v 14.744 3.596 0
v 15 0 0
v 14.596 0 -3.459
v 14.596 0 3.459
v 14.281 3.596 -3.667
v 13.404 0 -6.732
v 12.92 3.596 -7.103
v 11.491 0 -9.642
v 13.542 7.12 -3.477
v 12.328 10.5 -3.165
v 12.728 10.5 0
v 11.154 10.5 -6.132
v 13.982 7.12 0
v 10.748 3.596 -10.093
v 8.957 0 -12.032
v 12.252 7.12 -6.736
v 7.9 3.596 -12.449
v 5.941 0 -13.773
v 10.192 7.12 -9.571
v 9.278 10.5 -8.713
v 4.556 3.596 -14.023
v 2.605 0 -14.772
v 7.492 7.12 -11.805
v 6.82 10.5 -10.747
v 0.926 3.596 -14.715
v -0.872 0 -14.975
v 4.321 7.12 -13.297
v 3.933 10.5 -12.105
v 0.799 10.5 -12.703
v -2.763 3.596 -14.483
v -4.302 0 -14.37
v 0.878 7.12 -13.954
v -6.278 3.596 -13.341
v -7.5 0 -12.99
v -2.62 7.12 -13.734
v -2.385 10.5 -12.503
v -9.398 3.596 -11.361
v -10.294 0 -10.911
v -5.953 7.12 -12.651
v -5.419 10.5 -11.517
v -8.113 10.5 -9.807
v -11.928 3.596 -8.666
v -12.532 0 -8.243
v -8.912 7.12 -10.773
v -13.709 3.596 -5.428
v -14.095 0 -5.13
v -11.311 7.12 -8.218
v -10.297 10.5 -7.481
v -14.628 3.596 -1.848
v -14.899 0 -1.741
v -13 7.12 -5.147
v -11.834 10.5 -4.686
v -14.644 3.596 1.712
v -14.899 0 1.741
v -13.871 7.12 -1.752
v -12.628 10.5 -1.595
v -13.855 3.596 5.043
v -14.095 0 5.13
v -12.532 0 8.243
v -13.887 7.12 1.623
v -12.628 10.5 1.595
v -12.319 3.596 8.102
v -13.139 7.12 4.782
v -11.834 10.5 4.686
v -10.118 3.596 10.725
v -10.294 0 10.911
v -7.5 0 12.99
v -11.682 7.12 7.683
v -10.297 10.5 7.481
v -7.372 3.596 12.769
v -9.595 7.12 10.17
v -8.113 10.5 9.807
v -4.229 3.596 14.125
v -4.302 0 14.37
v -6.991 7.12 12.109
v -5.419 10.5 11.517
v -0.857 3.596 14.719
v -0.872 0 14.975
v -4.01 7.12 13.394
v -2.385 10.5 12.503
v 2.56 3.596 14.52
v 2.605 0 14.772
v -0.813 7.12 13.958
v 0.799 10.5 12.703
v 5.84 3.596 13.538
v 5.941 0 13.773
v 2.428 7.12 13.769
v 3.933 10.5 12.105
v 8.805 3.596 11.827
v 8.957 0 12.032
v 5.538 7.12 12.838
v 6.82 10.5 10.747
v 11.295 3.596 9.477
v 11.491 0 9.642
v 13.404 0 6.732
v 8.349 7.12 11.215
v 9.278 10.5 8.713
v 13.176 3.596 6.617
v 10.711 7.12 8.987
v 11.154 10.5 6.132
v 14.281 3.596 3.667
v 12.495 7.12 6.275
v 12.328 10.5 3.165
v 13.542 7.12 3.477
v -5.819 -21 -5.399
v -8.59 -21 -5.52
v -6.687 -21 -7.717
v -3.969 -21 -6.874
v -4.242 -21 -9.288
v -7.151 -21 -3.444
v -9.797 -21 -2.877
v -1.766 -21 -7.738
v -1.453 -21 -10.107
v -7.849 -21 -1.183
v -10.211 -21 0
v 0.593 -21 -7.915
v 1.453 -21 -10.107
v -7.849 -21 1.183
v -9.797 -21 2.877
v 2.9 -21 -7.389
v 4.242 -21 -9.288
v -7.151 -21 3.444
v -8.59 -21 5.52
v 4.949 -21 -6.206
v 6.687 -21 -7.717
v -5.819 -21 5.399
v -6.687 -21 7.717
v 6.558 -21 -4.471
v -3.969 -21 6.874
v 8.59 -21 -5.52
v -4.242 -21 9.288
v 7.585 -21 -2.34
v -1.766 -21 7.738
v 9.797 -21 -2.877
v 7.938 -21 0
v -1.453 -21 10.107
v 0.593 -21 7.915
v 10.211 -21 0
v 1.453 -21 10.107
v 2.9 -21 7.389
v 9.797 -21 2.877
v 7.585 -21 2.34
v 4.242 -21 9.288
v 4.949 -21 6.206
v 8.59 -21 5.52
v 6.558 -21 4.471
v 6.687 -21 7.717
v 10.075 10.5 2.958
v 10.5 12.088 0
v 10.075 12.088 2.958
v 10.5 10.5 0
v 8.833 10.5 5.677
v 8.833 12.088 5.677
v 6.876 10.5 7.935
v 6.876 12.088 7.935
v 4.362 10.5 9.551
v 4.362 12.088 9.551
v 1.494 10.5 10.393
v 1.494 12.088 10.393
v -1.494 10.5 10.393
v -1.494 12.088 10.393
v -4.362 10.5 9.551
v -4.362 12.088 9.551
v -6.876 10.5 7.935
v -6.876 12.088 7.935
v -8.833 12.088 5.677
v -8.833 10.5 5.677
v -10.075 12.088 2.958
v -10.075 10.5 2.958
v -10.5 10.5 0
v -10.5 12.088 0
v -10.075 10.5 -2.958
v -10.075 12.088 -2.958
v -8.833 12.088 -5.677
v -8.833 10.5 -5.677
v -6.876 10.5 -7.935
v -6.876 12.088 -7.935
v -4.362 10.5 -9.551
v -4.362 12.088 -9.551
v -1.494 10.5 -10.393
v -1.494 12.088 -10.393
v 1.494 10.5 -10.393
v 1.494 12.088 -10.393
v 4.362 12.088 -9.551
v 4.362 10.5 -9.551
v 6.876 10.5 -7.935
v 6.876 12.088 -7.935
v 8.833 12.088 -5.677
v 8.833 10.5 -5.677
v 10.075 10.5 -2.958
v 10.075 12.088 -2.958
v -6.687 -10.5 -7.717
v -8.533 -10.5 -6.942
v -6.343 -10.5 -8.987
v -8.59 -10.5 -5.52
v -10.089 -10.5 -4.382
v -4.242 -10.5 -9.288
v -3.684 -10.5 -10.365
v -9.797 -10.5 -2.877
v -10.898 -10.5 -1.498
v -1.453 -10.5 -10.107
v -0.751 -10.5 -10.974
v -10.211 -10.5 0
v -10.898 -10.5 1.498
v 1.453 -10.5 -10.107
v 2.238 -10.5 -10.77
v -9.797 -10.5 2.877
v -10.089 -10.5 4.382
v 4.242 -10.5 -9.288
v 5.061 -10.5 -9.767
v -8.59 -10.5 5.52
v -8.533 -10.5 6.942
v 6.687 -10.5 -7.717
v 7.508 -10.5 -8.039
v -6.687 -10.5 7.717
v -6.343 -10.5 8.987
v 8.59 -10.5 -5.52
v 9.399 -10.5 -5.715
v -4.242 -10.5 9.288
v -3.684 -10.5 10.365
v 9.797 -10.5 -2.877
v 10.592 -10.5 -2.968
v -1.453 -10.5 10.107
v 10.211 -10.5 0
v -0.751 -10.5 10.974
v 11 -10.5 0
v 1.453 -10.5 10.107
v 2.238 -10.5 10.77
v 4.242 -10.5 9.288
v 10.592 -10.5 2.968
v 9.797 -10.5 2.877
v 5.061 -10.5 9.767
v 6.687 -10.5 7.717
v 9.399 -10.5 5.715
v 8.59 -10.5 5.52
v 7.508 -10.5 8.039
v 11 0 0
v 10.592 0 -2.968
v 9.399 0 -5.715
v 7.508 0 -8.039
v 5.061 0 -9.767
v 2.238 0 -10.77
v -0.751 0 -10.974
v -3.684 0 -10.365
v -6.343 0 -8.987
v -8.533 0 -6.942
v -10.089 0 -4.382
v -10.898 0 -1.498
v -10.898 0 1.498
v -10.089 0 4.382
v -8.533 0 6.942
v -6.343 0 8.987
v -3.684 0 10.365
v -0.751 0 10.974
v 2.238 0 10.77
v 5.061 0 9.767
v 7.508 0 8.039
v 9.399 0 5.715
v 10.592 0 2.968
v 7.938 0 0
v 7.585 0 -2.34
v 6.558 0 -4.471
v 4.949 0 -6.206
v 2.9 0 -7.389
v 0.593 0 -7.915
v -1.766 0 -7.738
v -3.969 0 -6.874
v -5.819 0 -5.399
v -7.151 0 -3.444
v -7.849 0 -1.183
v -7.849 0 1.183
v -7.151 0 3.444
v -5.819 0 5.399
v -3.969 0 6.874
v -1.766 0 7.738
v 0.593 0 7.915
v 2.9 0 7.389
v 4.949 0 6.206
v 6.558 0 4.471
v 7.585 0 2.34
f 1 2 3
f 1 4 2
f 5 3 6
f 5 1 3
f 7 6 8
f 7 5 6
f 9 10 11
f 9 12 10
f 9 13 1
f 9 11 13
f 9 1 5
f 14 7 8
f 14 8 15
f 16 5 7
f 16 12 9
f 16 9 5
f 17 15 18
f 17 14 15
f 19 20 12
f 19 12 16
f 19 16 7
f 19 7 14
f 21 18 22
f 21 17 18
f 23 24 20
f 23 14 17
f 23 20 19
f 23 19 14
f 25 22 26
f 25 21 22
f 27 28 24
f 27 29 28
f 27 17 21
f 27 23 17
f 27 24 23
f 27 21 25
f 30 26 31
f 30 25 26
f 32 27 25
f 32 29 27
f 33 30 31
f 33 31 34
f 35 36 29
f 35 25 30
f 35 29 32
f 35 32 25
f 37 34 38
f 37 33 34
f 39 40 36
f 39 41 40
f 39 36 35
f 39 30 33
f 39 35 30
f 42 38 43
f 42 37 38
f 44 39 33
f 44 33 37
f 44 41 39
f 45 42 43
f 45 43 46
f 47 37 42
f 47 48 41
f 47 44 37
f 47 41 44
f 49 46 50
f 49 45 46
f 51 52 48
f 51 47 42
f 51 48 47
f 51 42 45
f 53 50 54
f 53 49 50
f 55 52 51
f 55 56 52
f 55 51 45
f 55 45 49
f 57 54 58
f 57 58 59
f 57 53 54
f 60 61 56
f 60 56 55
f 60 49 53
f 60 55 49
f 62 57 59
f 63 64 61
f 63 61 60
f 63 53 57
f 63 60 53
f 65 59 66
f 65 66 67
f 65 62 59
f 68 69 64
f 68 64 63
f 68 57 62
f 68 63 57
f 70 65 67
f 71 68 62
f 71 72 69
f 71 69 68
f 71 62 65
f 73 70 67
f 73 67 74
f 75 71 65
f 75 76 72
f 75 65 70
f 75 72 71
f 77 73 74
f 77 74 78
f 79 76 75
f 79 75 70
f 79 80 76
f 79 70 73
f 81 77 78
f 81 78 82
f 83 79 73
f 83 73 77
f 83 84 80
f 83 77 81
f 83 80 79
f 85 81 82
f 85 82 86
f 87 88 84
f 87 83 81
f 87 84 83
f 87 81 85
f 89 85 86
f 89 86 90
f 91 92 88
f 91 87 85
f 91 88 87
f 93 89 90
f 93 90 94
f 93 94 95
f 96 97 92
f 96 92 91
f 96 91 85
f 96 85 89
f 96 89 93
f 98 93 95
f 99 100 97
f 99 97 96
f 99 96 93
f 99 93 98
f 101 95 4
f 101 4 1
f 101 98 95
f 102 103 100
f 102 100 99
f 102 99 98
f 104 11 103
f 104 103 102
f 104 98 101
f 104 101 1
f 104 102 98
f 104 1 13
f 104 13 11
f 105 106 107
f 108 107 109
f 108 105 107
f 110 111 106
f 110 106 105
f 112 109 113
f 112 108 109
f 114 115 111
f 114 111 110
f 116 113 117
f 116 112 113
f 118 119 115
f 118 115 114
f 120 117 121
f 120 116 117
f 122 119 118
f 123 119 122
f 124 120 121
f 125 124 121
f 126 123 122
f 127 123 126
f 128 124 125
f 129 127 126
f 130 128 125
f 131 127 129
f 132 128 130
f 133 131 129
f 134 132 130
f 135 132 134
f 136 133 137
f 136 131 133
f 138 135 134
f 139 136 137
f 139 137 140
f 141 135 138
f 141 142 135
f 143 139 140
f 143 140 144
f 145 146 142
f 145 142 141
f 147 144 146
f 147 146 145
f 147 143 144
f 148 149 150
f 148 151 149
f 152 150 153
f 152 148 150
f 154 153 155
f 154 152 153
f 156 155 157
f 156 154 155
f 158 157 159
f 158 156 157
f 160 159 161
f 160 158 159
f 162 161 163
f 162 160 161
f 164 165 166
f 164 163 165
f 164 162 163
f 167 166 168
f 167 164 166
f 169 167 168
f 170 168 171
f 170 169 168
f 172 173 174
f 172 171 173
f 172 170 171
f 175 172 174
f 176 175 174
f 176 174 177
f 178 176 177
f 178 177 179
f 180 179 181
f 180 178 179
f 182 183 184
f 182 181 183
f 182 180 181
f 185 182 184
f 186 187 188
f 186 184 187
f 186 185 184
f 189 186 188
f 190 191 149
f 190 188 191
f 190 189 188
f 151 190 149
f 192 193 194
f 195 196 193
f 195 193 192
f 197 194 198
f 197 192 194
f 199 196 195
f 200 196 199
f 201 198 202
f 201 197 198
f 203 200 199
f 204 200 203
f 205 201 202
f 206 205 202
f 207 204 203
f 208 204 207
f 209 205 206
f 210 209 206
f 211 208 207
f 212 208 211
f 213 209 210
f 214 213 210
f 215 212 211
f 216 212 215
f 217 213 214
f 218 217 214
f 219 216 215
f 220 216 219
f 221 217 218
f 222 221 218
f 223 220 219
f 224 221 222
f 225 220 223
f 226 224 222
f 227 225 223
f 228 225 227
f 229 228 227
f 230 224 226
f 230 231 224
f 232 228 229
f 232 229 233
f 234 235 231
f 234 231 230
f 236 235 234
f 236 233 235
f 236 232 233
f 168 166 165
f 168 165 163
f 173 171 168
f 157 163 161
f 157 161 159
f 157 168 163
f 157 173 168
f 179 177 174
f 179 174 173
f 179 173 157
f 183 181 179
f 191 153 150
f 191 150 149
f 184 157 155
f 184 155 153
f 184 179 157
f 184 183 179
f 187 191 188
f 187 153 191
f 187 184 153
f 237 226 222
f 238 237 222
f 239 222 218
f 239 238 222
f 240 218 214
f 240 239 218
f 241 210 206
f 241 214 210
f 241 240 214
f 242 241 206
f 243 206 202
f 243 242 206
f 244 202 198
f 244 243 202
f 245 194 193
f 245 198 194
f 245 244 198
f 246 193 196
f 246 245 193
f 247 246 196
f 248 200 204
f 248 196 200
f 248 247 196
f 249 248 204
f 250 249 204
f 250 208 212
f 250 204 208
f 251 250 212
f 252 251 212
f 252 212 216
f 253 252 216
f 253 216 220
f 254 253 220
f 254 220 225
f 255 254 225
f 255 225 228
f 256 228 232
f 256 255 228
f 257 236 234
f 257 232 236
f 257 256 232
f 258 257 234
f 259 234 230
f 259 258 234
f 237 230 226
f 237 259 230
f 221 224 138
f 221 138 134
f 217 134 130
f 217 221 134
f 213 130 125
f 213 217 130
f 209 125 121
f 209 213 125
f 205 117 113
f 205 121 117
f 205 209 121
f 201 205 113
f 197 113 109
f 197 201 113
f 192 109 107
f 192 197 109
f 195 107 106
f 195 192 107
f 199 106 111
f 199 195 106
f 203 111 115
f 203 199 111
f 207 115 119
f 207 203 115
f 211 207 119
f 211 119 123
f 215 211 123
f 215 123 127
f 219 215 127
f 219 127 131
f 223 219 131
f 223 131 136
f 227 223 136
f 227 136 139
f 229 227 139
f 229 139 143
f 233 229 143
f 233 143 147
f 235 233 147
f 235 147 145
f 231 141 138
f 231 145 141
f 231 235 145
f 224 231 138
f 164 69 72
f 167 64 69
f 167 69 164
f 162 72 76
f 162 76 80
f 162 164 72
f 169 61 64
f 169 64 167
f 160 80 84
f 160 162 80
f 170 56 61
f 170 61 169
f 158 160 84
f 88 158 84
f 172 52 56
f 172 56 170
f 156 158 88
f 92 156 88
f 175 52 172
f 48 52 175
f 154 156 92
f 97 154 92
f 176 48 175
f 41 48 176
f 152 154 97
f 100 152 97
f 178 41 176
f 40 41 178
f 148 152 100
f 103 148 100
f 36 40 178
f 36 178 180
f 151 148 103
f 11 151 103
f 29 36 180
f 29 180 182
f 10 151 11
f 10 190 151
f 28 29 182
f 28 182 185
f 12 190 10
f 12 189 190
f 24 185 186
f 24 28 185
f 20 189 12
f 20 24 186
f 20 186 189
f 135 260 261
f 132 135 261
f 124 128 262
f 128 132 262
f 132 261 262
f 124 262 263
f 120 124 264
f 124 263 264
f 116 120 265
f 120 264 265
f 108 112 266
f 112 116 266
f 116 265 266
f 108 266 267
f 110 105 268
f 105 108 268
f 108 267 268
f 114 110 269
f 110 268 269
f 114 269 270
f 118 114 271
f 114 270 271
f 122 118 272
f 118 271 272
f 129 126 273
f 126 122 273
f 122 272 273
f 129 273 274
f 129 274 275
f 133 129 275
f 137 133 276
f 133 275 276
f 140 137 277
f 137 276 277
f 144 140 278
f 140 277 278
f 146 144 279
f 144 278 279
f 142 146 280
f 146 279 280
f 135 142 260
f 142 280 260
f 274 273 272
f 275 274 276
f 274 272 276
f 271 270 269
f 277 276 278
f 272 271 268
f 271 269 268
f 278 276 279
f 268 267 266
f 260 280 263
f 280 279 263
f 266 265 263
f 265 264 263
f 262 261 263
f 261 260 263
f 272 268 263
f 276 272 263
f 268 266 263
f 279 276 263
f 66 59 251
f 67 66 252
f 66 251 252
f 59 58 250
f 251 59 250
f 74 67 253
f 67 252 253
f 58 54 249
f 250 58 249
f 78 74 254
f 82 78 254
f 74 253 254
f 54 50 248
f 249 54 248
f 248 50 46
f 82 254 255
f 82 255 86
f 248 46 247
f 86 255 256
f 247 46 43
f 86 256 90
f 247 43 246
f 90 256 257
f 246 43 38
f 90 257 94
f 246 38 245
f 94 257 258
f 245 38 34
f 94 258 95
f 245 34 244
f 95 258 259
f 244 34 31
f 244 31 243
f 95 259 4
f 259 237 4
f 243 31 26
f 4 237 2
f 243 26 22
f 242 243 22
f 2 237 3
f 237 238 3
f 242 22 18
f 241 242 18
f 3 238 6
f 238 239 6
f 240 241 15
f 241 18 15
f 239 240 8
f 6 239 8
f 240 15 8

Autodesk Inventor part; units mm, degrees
ref_plane "YZ Plane" through (0, 0, 0) normal (1, 0, 0) x (0, 1, 0)
ref_plane "XZ Plane" through (0, 0, 0) normal (0, 1, 0) x (-1, 0, 0)
ref_plane "XY Plane" through (0, 0, 0) normal (0, 0, 1) x (1, 0, 0)
sketch "Sketch9" plane through (0, 0, 0) normal (0, 0, 1) x (1, 0, 0)
  line L0 (0, 0) -> (0, 10.5)
  line L1 (0, 0) -> (15, 0)
  arc A0 (15, 0) -> (12.7281, 10.5) centre (-10.4, 0) ccw
  line L2 (12.7281, 10.5) -> (0, 10.5)
  dimension "d35" = 30
  dimension "d37" = 25.4
  dimension "d43" = 10.5
revolve "Revolution1" add sketch "Sketch9" angle 360 about axis through (0, 0, 0) along (0, 1, 0)
sketch "Sketch10" plane through (0, 10.5, 0) normal (0, 1, 0) x (1, 0, 0)
  circle A0 centre (0, 0) radius 12.7281 projected
  circle A1 centre (0, 0) radius 10.5
  dimension "d39" = 21
extrude "Extrusion6" add sketch "Sketch10" along normal blind 1.5875 contours A1
sketch "Sketch11" plane through (0, 0, 0) normal (0, -1, 0) x (1, 0, 0)
  circle A0 centre (0, 0) radius 15 projected
  circle A1 centre (0, 0) radius 11
  circle A2 centre (0, 0) radius 7.9375
  dimension "d42" = 22
  dimension "d44" = 15.875
extrude "Extrusion7" add sketch "Sketch11" along normal blind 10.5 contours A1
sketch "Sketch12" plane through (0, -10.5, 0) normal (0, -1, 0) x (1, 0, 0)
  circle A0 centre (0, 0) radius 7.9375 projected
  circle A1 centre (0, 0) radius 11 projected
  circle A2 centre (0, 0) radius 10.2108
  dimension "d47" = 20.4216
extrude "Extrusion8" add sketch "Sketch12" along normal blind 10.5 contours A2
properties part number "22 MM Push Button Red" material "Delrin, Black"
